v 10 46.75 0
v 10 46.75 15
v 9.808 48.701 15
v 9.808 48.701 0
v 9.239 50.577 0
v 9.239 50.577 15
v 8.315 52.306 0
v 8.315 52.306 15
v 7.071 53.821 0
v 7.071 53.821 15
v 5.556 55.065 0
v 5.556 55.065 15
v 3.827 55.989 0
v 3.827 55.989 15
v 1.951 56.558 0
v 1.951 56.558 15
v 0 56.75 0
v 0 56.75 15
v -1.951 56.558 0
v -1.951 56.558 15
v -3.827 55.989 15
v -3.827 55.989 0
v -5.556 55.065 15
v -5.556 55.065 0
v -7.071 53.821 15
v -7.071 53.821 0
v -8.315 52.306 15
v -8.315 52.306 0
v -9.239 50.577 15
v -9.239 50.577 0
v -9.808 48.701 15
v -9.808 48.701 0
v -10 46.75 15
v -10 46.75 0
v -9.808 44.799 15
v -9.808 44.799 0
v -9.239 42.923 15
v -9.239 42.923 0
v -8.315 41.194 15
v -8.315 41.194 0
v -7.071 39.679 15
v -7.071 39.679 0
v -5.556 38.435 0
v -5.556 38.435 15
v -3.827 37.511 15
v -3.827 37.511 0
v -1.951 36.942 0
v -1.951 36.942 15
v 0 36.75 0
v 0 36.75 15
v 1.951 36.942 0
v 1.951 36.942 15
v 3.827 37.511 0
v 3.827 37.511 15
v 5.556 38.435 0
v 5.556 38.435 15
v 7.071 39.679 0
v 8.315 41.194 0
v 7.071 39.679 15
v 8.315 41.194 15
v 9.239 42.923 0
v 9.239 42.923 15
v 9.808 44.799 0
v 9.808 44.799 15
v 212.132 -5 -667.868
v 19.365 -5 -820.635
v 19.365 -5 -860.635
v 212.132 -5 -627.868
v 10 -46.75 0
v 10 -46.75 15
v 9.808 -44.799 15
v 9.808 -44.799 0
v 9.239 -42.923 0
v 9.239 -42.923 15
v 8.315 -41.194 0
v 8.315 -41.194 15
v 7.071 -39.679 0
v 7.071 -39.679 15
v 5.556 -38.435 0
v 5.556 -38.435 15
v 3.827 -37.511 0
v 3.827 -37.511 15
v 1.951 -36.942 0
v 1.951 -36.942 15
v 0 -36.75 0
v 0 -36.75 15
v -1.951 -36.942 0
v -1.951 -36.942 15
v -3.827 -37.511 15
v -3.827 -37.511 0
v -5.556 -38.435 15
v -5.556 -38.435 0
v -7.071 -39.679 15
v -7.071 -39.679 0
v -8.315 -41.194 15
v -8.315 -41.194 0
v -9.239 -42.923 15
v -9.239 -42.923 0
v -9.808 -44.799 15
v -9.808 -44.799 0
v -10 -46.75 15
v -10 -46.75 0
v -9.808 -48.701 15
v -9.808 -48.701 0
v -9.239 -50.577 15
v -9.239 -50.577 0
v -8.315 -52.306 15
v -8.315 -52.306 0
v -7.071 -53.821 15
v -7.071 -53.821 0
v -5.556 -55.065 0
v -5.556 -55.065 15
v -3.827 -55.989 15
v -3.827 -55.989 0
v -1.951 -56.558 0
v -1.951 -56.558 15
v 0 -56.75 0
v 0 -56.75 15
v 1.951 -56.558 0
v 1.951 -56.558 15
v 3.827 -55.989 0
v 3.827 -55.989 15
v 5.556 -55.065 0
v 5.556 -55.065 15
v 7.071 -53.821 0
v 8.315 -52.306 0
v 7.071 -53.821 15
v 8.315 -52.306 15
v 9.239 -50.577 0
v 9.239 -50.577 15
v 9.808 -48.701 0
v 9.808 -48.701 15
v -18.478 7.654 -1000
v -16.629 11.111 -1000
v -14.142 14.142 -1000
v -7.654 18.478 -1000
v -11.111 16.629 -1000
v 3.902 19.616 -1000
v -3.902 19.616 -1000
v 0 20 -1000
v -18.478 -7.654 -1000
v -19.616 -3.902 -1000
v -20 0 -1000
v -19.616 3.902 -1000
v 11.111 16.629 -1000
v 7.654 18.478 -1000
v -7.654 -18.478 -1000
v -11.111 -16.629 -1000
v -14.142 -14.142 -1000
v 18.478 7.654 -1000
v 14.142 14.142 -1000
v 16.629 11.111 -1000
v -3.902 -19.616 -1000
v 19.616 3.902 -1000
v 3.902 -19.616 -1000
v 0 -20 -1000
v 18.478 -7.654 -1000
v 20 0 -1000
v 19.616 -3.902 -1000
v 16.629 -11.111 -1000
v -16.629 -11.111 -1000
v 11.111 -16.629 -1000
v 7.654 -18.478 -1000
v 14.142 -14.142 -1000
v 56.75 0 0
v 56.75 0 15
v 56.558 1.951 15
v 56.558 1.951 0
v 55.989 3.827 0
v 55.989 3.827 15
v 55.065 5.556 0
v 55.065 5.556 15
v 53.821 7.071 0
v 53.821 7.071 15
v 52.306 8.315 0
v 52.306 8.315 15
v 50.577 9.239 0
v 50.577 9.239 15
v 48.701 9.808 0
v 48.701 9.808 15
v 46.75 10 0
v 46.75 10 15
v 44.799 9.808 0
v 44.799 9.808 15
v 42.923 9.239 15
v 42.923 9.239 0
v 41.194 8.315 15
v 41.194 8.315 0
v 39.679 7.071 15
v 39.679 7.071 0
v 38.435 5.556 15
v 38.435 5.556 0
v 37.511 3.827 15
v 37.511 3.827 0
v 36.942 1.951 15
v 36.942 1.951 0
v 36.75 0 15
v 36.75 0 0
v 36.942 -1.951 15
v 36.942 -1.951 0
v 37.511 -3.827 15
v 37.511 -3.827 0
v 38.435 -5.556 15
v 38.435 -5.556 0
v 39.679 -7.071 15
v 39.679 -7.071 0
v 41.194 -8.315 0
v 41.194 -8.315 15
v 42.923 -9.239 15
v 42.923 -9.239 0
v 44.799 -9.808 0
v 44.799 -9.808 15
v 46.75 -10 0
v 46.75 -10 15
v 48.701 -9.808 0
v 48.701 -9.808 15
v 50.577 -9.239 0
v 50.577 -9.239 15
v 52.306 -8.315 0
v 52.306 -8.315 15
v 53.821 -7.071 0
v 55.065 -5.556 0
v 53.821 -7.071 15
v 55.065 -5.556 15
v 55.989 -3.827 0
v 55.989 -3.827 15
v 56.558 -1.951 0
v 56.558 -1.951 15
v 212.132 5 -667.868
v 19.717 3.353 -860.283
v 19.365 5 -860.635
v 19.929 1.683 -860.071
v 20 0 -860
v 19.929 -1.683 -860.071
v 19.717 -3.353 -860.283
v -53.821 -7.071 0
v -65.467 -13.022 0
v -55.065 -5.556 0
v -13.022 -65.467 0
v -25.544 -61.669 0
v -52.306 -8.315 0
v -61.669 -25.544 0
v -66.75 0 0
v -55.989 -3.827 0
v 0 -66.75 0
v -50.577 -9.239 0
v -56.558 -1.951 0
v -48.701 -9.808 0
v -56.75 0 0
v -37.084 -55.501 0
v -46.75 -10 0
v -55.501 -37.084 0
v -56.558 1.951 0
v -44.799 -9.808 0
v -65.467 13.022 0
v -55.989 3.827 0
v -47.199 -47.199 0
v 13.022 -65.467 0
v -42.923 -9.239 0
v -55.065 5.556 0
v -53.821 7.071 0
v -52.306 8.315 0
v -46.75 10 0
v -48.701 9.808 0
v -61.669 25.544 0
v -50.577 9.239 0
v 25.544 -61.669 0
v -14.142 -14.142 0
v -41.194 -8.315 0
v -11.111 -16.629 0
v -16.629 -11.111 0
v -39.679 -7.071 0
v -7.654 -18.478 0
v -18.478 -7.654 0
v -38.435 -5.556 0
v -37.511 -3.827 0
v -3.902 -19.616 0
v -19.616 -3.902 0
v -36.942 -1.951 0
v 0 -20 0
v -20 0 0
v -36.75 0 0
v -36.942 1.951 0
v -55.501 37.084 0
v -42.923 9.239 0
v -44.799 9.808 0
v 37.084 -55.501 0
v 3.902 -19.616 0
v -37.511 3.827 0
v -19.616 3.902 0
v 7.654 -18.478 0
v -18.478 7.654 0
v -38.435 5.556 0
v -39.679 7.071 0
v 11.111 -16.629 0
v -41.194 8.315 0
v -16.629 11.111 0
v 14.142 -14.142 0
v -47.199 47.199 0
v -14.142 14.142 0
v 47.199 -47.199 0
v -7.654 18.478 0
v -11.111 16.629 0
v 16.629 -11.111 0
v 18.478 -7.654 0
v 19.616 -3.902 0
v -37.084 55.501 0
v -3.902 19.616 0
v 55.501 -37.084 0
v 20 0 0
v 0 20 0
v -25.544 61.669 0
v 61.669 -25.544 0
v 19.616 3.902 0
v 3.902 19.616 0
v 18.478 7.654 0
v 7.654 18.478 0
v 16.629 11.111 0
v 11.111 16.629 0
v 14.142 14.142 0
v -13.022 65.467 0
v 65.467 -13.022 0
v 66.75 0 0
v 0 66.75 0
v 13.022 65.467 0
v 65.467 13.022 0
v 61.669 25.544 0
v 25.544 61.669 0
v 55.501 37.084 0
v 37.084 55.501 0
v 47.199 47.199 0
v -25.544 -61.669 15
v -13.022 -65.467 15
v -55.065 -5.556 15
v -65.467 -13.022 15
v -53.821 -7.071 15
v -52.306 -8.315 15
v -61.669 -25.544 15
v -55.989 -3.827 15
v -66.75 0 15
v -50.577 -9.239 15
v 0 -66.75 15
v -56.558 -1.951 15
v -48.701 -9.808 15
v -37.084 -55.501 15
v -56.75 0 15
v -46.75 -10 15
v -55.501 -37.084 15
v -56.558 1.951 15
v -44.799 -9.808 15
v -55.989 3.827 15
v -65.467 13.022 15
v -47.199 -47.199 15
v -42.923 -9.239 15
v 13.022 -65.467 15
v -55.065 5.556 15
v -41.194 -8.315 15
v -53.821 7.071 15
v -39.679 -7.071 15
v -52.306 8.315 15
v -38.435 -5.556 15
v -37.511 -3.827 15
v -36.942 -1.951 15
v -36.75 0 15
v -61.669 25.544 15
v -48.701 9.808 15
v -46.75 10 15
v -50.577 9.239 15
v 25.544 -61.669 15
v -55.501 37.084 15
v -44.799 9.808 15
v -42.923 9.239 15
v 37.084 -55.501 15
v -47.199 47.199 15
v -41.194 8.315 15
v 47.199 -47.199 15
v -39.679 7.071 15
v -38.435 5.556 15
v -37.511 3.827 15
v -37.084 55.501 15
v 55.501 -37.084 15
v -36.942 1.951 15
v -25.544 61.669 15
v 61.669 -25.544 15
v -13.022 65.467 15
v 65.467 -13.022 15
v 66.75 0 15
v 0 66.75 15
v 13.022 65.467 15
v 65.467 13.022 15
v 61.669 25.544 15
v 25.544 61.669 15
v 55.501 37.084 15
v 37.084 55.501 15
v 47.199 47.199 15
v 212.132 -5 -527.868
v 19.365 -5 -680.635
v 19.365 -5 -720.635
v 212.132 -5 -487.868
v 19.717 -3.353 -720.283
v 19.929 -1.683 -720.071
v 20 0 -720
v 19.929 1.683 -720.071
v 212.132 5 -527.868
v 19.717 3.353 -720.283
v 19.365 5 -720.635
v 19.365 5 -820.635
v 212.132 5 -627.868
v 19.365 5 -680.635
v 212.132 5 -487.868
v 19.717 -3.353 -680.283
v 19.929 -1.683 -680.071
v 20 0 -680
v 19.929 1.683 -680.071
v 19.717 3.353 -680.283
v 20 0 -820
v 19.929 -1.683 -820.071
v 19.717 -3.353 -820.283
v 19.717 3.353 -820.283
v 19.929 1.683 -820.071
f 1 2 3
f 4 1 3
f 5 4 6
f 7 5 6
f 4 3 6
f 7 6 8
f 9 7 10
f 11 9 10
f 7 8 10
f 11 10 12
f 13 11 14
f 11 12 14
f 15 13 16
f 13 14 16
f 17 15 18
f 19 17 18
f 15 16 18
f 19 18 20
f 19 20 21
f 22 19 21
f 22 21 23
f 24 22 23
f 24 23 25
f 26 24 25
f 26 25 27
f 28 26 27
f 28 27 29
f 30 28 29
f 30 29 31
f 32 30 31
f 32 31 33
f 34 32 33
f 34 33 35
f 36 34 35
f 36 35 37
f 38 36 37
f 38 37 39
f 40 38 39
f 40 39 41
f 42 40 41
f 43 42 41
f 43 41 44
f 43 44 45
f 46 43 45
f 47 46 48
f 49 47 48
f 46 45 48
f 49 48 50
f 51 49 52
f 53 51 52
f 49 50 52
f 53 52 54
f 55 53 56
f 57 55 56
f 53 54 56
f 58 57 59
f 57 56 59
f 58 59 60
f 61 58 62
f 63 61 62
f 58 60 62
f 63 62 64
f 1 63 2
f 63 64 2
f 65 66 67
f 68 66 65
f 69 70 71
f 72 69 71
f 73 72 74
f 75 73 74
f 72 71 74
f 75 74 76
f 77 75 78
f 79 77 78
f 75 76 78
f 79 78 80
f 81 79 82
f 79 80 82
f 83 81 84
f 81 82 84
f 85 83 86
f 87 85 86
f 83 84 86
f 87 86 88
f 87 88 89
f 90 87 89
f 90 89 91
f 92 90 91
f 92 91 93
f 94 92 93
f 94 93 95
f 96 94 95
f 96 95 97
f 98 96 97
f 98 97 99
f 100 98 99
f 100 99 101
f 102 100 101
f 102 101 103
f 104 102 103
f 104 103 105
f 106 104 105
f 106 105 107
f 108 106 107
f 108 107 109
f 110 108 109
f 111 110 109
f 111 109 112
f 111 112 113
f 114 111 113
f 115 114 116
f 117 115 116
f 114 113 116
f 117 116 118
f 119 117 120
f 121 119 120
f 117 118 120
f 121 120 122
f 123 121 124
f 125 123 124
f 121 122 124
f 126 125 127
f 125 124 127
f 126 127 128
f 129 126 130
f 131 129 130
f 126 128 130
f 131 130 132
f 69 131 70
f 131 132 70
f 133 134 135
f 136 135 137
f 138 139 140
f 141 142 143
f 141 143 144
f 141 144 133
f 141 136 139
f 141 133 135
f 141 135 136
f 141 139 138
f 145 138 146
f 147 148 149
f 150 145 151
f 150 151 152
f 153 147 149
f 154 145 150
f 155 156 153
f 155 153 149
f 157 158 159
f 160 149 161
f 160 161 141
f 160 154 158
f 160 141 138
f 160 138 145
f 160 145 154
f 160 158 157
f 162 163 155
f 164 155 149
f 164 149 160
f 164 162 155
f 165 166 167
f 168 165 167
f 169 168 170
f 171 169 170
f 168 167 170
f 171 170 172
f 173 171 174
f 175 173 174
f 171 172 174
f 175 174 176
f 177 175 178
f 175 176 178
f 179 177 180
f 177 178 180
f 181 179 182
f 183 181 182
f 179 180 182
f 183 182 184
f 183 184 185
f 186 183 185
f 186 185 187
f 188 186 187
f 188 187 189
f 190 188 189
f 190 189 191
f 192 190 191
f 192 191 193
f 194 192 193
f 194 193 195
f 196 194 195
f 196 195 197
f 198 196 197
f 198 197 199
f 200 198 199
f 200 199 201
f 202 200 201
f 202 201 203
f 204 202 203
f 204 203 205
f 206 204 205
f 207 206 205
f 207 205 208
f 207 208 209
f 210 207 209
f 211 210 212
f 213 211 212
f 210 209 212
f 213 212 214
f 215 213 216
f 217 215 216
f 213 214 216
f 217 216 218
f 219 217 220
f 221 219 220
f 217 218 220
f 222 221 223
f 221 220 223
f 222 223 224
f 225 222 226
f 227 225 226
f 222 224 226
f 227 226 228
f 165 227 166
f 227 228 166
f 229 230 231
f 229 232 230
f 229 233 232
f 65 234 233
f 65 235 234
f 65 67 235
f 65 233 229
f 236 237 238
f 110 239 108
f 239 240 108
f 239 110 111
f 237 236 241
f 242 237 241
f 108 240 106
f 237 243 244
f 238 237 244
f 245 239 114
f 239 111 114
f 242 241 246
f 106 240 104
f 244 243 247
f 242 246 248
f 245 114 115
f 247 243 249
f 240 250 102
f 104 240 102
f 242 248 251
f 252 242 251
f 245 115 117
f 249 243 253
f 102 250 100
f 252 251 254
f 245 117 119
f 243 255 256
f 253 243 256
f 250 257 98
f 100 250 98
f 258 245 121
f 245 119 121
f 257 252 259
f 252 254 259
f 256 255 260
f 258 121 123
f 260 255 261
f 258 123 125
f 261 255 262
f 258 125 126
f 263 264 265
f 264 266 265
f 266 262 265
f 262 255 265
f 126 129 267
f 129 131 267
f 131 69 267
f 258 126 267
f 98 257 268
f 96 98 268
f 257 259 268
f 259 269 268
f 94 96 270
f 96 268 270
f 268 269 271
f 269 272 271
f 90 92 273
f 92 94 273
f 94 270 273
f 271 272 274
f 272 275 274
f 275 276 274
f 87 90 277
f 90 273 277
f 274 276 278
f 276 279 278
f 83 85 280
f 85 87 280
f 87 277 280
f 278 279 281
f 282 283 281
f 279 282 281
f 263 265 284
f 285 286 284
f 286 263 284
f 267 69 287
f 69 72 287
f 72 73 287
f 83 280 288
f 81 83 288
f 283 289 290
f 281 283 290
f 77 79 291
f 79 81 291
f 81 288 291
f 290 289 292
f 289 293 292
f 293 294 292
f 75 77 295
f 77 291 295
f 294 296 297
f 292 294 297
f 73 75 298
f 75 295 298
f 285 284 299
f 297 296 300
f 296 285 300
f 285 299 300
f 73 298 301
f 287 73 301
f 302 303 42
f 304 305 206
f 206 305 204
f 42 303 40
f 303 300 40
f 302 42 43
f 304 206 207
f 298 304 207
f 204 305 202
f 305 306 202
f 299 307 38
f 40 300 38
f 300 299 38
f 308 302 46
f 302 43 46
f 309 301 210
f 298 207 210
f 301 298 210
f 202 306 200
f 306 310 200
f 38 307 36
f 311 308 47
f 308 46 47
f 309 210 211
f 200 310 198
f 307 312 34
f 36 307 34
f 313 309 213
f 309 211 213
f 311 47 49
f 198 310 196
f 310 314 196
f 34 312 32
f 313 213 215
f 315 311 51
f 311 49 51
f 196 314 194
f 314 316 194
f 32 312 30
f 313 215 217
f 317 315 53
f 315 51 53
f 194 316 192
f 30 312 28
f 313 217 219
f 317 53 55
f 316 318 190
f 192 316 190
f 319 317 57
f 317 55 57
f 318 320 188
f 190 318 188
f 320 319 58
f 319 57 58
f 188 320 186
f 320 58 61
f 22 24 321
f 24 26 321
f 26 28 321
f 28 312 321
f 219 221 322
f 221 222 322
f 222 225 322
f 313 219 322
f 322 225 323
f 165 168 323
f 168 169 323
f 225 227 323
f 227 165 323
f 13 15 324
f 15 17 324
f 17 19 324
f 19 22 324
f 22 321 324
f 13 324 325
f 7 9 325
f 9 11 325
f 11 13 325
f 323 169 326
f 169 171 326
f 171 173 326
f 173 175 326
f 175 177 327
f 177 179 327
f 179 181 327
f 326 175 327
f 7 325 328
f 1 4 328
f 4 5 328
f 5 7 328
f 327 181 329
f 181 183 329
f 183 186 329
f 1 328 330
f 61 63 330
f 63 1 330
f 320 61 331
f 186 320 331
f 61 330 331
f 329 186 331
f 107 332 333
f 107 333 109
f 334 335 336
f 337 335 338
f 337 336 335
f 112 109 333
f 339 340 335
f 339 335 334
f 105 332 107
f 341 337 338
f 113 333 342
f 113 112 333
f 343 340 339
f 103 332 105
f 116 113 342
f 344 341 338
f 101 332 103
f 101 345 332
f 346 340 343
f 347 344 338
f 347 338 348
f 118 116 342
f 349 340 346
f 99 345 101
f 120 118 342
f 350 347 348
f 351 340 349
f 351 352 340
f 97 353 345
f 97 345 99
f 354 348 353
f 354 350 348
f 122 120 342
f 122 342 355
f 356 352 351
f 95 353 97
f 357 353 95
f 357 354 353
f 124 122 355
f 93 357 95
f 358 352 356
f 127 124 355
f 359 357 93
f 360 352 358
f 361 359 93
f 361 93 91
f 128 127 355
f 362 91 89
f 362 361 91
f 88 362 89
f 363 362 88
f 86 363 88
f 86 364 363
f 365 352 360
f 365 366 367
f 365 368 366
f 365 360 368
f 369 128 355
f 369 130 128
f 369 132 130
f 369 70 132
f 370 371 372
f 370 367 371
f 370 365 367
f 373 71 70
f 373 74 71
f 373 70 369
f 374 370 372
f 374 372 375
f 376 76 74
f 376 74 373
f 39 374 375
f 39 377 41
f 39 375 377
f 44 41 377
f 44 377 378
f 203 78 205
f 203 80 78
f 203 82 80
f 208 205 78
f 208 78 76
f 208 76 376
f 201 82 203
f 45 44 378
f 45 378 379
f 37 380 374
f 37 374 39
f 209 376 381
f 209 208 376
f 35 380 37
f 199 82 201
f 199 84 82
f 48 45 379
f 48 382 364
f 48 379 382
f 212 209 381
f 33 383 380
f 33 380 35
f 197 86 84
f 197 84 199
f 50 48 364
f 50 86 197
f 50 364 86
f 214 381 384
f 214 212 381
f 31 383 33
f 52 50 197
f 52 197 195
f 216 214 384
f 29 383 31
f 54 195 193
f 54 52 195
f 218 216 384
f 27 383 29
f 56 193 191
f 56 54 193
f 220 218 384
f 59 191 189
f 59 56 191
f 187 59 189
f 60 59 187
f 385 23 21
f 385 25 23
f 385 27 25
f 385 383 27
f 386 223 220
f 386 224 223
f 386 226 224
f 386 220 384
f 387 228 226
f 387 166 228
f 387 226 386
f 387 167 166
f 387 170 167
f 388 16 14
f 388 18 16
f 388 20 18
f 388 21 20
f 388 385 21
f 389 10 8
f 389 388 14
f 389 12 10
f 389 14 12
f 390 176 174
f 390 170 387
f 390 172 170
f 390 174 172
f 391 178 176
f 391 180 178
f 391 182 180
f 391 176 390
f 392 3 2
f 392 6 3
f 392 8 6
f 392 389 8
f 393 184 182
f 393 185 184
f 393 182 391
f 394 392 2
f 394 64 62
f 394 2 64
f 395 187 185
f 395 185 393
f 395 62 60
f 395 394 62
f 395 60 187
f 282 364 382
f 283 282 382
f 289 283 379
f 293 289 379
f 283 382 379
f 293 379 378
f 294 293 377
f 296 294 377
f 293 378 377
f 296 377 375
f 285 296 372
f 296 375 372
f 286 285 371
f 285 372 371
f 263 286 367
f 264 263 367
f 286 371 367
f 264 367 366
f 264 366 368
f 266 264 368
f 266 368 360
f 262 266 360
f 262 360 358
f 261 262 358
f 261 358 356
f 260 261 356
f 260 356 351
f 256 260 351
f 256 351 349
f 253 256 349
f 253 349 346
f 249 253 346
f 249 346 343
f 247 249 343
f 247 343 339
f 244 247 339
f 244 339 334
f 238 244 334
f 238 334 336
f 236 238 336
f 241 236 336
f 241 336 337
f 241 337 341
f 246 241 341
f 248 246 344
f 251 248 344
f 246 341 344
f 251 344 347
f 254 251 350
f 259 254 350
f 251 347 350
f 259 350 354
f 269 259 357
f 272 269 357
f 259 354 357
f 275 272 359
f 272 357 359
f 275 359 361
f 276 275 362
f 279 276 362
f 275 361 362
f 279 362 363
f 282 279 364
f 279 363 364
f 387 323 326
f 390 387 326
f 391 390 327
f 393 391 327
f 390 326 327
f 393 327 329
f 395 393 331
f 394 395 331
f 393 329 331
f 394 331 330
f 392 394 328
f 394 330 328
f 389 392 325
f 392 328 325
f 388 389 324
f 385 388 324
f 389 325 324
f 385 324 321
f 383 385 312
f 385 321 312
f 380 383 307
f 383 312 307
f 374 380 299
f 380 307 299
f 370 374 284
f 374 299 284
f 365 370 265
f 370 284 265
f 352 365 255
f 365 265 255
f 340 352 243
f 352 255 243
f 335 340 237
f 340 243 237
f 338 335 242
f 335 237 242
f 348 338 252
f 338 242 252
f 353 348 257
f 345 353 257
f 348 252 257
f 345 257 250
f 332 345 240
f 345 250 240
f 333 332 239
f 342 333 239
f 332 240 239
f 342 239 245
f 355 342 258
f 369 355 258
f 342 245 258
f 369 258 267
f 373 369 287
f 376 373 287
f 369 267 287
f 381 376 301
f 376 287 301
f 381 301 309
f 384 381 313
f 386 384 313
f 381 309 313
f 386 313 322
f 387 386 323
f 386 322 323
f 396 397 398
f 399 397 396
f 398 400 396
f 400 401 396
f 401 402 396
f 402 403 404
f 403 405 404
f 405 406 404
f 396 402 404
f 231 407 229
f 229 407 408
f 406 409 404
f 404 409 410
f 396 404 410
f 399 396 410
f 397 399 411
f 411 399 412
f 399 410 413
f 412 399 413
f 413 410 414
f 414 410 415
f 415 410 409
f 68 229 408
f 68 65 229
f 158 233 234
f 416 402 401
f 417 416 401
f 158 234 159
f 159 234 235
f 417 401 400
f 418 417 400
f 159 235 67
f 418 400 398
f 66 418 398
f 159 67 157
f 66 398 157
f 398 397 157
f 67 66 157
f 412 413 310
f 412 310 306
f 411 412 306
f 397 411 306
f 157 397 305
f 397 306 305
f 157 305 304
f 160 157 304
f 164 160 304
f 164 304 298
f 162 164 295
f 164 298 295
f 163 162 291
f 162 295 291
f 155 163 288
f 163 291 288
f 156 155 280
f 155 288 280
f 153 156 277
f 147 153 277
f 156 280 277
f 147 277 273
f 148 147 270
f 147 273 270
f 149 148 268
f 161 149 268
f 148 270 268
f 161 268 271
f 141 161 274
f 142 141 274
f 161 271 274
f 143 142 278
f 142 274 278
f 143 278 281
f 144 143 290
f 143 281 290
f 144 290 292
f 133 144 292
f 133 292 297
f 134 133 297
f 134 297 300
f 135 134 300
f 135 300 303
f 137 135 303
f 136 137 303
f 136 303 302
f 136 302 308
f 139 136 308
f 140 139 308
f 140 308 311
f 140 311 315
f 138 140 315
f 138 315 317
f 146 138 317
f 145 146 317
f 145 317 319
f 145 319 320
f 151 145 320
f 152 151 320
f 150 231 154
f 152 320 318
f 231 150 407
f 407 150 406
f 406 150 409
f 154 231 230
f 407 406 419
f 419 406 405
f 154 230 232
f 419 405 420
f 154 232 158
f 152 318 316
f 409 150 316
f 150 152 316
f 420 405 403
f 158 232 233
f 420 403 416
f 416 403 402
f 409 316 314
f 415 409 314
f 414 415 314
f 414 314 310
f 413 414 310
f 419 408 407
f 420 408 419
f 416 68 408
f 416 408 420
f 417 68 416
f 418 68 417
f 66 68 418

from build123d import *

# Parameters (mm, degrees)
F0_R     = 66.75
F1_DEPTH = 15
F2_R     = 20
F3_DEPTH = 1000
F5_DEPTH = 5
F6_R     = 10
F7_DEPTH = 50.8


with BuildPart() as f1:
    # F0 (on Top) → F1 (new body)
    with BuildSketch(Plane.XY):
        Circle(F0_R)
    extrude(amount=F1_DEPTH)

    # F2 (on face) → F3 (join)
    with BuildSketch(Plane(origin=(0, 0, 0), x_dir=(1, 0, 0), z_dir=(0, 0, -1))):
        Circle(F2_R)
    extrude(amount=F3_DEPTH)

    # F4 (on Front) → F5 (join, symmetric)
    with BuildSketch(Plane.XZ):
        Polygon((212.132034, -487.867966), (0, -700), (0, -740), (212.132034, -527.867966), align=None)
        Polygon((212.132034, -627.867966), (0, -840), (0, -880), (212.132034, -667.867966), align=None)
    extrude(amount=F5_DEPTH, both=True)

    # F6 (on face) → F7 (cut)
    with BuildSketch(Plane.XY.offset(15)):
        with Locations((0, -46.75)):
            Circle(F6_R)
        with Locations((46.75, 0)):
            Circle(F6_R)
        with Locations((0, 46.75)):
            Circle(F6_R)
        with Locations((-46.75, 0)):
            Circle(F6_R)
    extrude(amount=-F7_DEPTH, mode=Mode.SUBTRACT)


solid = f1.part
